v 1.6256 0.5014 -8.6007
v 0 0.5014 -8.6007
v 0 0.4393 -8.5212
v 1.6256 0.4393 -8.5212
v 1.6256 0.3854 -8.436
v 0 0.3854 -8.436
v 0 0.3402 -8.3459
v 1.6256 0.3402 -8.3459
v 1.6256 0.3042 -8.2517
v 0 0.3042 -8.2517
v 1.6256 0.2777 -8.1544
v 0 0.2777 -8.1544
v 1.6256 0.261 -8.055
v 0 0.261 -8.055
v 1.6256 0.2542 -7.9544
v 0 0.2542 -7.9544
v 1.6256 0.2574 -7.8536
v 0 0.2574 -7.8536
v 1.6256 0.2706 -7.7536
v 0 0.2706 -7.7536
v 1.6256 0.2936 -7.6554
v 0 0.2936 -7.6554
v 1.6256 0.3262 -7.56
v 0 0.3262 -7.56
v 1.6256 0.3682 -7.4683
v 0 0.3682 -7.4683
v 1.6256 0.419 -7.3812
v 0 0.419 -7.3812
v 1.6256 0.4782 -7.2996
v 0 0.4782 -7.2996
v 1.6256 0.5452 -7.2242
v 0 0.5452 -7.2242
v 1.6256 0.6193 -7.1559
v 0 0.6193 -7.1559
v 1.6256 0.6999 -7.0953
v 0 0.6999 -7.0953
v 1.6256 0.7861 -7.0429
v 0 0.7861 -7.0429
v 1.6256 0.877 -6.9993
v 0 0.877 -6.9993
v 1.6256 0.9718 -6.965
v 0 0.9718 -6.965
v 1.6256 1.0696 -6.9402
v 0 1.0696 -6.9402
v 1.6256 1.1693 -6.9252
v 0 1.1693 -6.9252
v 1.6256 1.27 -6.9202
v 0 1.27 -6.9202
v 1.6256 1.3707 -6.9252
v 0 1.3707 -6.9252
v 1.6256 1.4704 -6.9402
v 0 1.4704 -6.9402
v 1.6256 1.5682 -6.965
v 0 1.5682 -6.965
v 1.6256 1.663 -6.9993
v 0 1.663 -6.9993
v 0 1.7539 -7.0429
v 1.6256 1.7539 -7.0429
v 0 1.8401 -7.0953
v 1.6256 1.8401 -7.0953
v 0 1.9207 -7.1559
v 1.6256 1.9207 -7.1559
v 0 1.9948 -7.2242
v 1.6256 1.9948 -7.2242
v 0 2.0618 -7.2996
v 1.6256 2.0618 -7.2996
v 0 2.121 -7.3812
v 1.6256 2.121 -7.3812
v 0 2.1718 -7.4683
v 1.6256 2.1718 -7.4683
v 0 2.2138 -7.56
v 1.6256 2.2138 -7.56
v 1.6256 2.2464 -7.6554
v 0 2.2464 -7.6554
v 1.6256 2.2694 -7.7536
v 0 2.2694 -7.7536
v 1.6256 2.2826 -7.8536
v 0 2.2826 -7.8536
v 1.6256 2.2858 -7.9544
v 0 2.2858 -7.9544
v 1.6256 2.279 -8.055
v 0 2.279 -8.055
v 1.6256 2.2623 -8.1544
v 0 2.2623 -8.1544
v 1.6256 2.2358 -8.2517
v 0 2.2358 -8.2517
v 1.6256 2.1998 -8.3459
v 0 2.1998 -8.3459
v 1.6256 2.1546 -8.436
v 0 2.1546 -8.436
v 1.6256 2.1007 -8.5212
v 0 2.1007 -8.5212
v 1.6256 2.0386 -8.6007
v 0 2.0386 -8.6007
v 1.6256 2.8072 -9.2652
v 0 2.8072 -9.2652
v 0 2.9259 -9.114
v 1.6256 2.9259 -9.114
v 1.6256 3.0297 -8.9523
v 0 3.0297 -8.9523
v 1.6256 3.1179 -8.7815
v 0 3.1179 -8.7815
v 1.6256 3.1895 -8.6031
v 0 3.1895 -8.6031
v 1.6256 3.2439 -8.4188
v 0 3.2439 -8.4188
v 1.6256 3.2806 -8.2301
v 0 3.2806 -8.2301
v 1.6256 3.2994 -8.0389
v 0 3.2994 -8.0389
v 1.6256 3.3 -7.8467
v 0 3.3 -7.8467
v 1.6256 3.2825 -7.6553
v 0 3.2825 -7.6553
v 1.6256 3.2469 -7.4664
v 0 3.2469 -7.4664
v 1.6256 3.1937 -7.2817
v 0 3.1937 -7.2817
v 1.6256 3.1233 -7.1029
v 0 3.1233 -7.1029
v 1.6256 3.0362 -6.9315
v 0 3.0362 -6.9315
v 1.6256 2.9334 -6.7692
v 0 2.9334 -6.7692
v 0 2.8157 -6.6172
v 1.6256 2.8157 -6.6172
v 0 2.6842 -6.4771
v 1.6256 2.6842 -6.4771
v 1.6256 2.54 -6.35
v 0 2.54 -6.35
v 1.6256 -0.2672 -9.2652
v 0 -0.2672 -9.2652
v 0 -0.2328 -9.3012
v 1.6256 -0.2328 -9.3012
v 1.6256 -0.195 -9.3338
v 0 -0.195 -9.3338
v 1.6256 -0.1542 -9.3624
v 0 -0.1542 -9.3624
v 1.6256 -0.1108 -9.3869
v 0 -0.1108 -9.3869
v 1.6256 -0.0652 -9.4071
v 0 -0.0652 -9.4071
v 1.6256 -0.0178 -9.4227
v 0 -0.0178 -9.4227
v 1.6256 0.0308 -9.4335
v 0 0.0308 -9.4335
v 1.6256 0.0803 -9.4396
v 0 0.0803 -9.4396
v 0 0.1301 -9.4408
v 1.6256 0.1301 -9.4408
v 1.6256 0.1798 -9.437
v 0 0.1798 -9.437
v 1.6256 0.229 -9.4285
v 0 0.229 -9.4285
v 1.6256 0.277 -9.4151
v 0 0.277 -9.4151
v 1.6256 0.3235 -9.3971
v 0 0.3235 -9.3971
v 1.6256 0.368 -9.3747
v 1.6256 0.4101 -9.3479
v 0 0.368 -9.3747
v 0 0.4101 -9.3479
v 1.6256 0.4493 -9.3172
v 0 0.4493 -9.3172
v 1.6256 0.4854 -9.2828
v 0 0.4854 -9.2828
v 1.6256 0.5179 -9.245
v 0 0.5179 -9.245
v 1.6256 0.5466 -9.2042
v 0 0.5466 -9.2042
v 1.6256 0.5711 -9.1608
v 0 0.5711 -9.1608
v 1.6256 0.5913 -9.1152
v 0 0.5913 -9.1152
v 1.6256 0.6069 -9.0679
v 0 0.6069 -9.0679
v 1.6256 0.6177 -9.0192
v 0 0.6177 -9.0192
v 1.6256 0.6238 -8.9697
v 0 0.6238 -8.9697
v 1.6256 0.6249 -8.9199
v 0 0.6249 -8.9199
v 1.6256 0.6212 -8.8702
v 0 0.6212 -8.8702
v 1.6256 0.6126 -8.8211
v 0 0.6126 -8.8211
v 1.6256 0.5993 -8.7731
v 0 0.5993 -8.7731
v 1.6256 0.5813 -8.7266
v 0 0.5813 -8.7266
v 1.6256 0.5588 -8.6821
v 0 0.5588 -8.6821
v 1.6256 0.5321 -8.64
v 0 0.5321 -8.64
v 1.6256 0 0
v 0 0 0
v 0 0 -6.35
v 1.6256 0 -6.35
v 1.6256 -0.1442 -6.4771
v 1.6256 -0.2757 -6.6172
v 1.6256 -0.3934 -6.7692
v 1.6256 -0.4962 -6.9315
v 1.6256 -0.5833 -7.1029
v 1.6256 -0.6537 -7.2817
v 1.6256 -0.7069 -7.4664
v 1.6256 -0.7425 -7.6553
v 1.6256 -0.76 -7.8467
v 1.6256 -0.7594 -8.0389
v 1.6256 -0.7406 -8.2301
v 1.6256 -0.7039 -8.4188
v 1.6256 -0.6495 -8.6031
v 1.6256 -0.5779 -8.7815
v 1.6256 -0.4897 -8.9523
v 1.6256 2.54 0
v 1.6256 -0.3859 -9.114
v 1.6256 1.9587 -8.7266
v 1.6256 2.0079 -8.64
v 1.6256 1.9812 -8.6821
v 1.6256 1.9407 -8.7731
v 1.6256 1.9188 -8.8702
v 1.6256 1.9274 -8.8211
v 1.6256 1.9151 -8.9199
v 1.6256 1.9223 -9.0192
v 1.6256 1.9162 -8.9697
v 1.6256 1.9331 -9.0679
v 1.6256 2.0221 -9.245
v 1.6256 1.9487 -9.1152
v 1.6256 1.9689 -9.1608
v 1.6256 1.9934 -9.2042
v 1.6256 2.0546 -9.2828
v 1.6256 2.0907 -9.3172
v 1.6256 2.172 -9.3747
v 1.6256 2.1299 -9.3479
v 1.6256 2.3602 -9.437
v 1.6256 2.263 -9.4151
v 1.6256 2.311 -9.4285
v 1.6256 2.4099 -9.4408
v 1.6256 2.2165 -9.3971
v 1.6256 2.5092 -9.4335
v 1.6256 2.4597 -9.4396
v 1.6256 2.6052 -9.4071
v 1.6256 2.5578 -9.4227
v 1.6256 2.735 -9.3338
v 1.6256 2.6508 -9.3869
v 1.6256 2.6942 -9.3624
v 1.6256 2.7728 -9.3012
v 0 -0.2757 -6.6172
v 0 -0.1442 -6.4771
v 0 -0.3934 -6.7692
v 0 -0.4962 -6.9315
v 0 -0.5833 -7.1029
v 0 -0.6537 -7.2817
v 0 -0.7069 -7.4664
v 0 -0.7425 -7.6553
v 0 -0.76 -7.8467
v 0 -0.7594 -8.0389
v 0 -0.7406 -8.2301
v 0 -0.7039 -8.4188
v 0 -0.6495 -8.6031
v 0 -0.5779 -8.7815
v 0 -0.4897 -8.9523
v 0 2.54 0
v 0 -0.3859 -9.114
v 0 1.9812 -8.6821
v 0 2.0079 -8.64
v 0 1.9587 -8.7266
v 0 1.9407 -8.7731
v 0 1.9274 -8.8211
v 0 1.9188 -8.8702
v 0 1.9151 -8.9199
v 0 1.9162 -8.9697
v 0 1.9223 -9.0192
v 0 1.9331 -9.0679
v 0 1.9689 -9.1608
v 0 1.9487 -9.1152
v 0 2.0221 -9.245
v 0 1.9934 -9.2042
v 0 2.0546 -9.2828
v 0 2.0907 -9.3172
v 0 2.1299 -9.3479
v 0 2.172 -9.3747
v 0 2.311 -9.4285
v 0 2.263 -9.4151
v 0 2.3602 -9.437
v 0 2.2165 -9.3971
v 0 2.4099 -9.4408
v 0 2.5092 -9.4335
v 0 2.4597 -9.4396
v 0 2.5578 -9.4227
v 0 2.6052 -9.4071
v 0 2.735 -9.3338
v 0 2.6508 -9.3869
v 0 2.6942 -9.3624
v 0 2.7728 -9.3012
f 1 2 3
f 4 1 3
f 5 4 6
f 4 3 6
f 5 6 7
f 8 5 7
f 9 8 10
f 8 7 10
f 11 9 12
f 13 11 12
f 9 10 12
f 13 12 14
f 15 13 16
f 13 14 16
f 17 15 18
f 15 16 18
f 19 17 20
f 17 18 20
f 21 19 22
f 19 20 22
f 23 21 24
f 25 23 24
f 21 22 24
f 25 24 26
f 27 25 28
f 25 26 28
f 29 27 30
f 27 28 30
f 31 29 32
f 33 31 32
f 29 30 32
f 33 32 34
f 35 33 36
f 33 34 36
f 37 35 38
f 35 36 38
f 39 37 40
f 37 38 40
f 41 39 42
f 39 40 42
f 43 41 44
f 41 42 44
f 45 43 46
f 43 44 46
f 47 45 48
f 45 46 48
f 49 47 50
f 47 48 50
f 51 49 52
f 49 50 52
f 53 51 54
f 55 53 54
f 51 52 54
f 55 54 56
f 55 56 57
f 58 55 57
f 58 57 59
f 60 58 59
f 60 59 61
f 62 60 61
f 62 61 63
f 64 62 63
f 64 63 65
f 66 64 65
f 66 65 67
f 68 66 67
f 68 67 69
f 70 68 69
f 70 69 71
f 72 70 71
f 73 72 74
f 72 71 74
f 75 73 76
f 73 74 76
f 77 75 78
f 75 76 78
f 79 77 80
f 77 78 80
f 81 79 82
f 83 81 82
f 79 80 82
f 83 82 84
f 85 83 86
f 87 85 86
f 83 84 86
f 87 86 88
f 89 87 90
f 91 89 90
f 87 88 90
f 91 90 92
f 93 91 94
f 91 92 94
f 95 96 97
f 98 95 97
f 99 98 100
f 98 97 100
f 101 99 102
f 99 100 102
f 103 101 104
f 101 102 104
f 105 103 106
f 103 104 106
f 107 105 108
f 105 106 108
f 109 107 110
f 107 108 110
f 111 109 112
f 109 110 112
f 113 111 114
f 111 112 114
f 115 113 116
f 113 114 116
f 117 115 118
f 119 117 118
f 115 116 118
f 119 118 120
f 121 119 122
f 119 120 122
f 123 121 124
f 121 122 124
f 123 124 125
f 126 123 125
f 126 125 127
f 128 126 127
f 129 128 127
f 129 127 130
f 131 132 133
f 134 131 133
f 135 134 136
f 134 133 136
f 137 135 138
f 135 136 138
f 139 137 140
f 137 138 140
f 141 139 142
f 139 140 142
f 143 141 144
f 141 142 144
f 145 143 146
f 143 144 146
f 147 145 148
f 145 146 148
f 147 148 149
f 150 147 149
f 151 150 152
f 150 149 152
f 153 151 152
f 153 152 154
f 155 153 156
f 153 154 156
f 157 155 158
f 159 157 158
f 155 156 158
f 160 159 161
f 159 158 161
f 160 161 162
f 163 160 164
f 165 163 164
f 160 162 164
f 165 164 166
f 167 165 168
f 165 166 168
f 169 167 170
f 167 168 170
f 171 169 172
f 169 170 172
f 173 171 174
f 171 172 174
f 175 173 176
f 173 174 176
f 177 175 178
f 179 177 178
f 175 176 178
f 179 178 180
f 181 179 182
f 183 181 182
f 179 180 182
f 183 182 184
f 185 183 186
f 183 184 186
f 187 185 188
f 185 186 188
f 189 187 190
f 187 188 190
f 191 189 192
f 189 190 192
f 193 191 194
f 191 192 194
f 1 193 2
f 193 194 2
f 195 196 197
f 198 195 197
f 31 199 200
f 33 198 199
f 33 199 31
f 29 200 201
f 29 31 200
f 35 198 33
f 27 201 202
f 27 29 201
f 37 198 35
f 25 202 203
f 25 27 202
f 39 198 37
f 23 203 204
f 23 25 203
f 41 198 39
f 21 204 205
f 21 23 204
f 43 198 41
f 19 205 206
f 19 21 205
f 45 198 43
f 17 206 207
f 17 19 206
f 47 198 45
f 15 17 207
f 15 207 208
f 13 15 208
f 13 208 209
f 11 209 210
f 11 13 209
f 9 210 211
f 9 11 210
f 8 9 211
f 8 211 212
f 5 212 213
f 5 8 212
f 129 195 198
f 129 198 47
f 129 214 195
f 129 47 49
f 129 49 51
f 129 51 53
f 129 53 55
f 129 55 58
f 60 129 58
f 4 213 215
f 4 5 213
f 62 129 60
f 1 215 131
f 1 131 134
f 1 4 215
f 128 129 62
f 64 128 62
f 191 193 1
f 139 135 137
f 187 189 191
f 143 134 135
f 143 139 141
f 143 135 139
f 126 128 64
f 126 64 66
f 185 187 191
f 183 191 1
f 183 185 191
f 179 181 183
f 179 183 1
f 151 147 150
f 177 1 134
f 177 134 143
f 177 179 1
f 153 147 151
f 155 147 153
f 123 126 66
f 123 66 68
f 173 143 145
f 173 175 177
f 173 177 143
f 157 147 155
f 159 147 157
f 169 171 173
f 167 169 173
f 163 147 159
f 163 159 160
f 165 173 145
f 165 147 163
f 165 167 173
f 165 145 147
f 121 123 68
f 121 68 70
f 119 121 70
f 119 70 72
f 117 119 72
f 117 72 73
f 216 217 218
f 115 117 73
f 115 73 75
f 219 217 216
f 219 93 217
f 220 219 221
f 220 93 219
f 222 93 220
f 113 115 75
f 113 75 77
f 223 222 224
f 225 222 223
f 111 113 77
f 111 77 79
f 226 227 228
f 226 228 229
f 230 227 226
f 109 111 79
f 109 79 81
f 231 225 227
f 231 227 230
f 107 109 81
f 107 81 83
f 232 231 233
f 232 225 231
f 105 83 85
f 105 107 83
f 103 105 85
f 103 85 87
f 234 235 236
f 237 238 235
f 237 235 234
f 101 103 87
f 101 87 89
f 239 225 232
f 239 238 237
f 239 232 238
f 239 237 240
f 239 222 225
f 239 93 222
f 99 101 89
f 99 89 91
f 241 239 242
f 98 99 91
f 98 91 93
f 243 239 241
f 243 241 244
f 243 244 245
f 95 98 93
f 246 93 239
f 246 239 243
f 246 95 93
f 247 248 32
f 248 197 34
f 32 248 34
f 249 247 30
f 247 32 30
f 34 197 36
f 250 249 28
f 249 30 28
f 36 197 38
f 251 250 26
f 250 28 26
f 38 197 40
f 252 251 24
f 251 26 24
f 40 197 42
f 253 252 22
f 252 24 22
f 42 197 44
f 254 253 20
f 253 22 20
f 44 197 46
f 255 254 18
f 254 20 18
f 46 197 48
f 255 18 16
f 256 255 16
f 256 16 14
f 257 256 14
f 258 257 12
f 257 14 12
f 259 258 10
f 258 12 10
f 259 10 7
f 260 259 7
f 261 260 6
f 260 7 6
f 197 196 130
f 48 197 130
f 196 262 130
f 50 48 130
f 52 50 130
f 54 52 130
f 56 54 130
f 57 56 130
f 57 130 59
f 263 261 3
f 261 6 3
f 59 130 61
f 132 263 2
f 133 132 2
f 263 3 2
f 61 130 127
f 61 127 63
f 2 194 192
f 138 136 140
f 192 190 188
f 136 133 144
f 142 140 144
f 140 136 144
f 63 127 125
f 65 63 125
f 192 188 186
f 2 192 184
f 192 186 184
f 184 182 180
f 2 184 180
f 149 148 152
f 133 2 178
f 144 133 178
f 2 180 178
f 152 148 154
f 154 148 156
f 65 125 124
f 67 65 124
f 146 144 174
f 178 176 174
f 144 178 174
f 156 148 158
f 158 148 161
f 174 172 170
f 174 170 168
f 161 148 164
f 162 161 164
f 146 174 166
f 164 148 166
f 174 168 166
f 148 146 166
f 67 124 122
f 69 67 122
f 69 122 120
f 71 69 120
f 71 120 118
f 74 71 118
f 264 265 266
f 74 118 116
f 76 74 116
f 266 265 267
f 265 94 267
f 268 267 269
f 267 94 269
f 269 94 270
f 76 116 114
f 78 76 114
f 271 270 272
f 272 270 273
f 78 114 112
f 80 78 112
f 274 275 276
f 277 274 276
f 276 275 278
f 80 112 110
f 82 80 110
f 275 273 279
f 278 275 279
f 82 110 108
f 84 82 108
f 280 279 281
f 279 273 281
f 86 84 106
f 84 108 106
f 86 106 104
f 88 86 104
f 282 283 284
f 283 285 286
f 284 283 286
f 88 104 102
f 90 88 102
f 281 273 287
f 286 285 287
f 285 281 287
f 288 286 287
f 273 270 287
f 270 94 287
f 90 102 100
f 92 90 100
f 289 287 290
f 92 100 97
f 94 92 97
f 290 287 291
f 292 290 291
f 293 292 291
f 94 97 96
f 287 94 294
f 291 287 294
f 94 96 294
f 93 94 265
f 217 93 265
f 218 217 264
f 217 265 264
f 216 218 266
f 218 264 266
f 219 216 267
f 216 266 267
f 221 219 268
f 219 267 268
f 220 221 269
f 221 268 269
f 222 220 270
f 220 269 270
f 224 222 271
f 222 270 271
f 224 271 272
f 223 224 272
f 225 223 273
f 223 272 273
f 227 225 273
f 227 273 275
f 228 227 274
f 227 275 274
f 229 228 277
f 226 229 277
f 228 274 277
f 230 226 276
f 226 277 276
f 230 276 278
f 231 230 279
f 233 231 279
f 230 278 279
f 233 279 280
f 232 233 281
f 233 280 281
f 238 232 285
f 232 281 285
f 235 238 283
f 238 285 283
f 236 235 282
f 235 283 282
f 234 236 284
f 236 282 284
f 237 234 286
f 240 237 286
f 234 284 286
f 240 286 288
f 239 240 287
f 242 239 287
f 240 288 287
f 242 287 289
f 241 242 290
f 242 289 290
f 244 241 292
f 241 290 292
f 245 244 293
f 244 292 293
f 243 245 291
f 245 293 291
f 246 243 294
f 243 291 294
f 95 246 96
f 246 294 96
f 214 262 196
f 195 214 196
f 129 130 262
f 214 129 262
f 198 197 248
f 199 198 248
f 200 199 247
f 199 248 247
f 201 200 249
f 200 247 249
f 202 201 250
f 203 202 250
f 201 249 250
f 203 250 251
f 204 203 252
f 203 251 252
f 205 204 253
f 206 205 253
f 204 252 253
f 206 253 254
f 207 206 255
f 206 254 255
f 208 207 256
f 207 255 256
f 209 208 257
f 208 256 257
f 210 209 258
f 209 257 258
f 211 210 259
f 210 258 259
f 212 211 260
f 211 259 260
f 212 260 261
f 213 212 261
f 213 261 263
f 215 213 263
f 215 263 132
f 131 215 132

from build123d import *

# Parameters (mm, degrees)
BOSS_EXTRUDE1_DEPTH = 1.6256


with BuildPart() as part:
    # Sketch1 → Boss-Extrude1 (new body)
    with BuildSketch(Plane(origin=(0, 0, 0), x_dir=(0, 0, -1), z_dir=(1, 0, 0))):
        with BuildLine():
            Line((0, 0), (6.35, 0))
            ThreePointArc((6.35, 0), (7.750762825, -0.753518252), (9.265164366, -0.267190977))
            ThreePointArc((9.265164366, -0.267190977), (9.317228392, 0.449340486), (8.600696929, 0.501404512))
            ThreePointArc((8.600696929, 0.501404512), (6.920229492, 1.27), (8.600696929, 2.038595488))
            ThreePointArc((8.600696929, 2.038595488), (9.317228392, 2.090659514), (9.265164366, 2.807190977))
            ThreePointArc((9.265164366, 2.807190977), (7.750762825, 3.293518252), (6.35, 2.54))
            Line((6.35, 2.54), (0, 2.54))
            Line((0, 2.54), (0, 0))
        make_face()
    extrude(amount=BOSS_EXTRUDE1_DEPTH)


solid = part.part
